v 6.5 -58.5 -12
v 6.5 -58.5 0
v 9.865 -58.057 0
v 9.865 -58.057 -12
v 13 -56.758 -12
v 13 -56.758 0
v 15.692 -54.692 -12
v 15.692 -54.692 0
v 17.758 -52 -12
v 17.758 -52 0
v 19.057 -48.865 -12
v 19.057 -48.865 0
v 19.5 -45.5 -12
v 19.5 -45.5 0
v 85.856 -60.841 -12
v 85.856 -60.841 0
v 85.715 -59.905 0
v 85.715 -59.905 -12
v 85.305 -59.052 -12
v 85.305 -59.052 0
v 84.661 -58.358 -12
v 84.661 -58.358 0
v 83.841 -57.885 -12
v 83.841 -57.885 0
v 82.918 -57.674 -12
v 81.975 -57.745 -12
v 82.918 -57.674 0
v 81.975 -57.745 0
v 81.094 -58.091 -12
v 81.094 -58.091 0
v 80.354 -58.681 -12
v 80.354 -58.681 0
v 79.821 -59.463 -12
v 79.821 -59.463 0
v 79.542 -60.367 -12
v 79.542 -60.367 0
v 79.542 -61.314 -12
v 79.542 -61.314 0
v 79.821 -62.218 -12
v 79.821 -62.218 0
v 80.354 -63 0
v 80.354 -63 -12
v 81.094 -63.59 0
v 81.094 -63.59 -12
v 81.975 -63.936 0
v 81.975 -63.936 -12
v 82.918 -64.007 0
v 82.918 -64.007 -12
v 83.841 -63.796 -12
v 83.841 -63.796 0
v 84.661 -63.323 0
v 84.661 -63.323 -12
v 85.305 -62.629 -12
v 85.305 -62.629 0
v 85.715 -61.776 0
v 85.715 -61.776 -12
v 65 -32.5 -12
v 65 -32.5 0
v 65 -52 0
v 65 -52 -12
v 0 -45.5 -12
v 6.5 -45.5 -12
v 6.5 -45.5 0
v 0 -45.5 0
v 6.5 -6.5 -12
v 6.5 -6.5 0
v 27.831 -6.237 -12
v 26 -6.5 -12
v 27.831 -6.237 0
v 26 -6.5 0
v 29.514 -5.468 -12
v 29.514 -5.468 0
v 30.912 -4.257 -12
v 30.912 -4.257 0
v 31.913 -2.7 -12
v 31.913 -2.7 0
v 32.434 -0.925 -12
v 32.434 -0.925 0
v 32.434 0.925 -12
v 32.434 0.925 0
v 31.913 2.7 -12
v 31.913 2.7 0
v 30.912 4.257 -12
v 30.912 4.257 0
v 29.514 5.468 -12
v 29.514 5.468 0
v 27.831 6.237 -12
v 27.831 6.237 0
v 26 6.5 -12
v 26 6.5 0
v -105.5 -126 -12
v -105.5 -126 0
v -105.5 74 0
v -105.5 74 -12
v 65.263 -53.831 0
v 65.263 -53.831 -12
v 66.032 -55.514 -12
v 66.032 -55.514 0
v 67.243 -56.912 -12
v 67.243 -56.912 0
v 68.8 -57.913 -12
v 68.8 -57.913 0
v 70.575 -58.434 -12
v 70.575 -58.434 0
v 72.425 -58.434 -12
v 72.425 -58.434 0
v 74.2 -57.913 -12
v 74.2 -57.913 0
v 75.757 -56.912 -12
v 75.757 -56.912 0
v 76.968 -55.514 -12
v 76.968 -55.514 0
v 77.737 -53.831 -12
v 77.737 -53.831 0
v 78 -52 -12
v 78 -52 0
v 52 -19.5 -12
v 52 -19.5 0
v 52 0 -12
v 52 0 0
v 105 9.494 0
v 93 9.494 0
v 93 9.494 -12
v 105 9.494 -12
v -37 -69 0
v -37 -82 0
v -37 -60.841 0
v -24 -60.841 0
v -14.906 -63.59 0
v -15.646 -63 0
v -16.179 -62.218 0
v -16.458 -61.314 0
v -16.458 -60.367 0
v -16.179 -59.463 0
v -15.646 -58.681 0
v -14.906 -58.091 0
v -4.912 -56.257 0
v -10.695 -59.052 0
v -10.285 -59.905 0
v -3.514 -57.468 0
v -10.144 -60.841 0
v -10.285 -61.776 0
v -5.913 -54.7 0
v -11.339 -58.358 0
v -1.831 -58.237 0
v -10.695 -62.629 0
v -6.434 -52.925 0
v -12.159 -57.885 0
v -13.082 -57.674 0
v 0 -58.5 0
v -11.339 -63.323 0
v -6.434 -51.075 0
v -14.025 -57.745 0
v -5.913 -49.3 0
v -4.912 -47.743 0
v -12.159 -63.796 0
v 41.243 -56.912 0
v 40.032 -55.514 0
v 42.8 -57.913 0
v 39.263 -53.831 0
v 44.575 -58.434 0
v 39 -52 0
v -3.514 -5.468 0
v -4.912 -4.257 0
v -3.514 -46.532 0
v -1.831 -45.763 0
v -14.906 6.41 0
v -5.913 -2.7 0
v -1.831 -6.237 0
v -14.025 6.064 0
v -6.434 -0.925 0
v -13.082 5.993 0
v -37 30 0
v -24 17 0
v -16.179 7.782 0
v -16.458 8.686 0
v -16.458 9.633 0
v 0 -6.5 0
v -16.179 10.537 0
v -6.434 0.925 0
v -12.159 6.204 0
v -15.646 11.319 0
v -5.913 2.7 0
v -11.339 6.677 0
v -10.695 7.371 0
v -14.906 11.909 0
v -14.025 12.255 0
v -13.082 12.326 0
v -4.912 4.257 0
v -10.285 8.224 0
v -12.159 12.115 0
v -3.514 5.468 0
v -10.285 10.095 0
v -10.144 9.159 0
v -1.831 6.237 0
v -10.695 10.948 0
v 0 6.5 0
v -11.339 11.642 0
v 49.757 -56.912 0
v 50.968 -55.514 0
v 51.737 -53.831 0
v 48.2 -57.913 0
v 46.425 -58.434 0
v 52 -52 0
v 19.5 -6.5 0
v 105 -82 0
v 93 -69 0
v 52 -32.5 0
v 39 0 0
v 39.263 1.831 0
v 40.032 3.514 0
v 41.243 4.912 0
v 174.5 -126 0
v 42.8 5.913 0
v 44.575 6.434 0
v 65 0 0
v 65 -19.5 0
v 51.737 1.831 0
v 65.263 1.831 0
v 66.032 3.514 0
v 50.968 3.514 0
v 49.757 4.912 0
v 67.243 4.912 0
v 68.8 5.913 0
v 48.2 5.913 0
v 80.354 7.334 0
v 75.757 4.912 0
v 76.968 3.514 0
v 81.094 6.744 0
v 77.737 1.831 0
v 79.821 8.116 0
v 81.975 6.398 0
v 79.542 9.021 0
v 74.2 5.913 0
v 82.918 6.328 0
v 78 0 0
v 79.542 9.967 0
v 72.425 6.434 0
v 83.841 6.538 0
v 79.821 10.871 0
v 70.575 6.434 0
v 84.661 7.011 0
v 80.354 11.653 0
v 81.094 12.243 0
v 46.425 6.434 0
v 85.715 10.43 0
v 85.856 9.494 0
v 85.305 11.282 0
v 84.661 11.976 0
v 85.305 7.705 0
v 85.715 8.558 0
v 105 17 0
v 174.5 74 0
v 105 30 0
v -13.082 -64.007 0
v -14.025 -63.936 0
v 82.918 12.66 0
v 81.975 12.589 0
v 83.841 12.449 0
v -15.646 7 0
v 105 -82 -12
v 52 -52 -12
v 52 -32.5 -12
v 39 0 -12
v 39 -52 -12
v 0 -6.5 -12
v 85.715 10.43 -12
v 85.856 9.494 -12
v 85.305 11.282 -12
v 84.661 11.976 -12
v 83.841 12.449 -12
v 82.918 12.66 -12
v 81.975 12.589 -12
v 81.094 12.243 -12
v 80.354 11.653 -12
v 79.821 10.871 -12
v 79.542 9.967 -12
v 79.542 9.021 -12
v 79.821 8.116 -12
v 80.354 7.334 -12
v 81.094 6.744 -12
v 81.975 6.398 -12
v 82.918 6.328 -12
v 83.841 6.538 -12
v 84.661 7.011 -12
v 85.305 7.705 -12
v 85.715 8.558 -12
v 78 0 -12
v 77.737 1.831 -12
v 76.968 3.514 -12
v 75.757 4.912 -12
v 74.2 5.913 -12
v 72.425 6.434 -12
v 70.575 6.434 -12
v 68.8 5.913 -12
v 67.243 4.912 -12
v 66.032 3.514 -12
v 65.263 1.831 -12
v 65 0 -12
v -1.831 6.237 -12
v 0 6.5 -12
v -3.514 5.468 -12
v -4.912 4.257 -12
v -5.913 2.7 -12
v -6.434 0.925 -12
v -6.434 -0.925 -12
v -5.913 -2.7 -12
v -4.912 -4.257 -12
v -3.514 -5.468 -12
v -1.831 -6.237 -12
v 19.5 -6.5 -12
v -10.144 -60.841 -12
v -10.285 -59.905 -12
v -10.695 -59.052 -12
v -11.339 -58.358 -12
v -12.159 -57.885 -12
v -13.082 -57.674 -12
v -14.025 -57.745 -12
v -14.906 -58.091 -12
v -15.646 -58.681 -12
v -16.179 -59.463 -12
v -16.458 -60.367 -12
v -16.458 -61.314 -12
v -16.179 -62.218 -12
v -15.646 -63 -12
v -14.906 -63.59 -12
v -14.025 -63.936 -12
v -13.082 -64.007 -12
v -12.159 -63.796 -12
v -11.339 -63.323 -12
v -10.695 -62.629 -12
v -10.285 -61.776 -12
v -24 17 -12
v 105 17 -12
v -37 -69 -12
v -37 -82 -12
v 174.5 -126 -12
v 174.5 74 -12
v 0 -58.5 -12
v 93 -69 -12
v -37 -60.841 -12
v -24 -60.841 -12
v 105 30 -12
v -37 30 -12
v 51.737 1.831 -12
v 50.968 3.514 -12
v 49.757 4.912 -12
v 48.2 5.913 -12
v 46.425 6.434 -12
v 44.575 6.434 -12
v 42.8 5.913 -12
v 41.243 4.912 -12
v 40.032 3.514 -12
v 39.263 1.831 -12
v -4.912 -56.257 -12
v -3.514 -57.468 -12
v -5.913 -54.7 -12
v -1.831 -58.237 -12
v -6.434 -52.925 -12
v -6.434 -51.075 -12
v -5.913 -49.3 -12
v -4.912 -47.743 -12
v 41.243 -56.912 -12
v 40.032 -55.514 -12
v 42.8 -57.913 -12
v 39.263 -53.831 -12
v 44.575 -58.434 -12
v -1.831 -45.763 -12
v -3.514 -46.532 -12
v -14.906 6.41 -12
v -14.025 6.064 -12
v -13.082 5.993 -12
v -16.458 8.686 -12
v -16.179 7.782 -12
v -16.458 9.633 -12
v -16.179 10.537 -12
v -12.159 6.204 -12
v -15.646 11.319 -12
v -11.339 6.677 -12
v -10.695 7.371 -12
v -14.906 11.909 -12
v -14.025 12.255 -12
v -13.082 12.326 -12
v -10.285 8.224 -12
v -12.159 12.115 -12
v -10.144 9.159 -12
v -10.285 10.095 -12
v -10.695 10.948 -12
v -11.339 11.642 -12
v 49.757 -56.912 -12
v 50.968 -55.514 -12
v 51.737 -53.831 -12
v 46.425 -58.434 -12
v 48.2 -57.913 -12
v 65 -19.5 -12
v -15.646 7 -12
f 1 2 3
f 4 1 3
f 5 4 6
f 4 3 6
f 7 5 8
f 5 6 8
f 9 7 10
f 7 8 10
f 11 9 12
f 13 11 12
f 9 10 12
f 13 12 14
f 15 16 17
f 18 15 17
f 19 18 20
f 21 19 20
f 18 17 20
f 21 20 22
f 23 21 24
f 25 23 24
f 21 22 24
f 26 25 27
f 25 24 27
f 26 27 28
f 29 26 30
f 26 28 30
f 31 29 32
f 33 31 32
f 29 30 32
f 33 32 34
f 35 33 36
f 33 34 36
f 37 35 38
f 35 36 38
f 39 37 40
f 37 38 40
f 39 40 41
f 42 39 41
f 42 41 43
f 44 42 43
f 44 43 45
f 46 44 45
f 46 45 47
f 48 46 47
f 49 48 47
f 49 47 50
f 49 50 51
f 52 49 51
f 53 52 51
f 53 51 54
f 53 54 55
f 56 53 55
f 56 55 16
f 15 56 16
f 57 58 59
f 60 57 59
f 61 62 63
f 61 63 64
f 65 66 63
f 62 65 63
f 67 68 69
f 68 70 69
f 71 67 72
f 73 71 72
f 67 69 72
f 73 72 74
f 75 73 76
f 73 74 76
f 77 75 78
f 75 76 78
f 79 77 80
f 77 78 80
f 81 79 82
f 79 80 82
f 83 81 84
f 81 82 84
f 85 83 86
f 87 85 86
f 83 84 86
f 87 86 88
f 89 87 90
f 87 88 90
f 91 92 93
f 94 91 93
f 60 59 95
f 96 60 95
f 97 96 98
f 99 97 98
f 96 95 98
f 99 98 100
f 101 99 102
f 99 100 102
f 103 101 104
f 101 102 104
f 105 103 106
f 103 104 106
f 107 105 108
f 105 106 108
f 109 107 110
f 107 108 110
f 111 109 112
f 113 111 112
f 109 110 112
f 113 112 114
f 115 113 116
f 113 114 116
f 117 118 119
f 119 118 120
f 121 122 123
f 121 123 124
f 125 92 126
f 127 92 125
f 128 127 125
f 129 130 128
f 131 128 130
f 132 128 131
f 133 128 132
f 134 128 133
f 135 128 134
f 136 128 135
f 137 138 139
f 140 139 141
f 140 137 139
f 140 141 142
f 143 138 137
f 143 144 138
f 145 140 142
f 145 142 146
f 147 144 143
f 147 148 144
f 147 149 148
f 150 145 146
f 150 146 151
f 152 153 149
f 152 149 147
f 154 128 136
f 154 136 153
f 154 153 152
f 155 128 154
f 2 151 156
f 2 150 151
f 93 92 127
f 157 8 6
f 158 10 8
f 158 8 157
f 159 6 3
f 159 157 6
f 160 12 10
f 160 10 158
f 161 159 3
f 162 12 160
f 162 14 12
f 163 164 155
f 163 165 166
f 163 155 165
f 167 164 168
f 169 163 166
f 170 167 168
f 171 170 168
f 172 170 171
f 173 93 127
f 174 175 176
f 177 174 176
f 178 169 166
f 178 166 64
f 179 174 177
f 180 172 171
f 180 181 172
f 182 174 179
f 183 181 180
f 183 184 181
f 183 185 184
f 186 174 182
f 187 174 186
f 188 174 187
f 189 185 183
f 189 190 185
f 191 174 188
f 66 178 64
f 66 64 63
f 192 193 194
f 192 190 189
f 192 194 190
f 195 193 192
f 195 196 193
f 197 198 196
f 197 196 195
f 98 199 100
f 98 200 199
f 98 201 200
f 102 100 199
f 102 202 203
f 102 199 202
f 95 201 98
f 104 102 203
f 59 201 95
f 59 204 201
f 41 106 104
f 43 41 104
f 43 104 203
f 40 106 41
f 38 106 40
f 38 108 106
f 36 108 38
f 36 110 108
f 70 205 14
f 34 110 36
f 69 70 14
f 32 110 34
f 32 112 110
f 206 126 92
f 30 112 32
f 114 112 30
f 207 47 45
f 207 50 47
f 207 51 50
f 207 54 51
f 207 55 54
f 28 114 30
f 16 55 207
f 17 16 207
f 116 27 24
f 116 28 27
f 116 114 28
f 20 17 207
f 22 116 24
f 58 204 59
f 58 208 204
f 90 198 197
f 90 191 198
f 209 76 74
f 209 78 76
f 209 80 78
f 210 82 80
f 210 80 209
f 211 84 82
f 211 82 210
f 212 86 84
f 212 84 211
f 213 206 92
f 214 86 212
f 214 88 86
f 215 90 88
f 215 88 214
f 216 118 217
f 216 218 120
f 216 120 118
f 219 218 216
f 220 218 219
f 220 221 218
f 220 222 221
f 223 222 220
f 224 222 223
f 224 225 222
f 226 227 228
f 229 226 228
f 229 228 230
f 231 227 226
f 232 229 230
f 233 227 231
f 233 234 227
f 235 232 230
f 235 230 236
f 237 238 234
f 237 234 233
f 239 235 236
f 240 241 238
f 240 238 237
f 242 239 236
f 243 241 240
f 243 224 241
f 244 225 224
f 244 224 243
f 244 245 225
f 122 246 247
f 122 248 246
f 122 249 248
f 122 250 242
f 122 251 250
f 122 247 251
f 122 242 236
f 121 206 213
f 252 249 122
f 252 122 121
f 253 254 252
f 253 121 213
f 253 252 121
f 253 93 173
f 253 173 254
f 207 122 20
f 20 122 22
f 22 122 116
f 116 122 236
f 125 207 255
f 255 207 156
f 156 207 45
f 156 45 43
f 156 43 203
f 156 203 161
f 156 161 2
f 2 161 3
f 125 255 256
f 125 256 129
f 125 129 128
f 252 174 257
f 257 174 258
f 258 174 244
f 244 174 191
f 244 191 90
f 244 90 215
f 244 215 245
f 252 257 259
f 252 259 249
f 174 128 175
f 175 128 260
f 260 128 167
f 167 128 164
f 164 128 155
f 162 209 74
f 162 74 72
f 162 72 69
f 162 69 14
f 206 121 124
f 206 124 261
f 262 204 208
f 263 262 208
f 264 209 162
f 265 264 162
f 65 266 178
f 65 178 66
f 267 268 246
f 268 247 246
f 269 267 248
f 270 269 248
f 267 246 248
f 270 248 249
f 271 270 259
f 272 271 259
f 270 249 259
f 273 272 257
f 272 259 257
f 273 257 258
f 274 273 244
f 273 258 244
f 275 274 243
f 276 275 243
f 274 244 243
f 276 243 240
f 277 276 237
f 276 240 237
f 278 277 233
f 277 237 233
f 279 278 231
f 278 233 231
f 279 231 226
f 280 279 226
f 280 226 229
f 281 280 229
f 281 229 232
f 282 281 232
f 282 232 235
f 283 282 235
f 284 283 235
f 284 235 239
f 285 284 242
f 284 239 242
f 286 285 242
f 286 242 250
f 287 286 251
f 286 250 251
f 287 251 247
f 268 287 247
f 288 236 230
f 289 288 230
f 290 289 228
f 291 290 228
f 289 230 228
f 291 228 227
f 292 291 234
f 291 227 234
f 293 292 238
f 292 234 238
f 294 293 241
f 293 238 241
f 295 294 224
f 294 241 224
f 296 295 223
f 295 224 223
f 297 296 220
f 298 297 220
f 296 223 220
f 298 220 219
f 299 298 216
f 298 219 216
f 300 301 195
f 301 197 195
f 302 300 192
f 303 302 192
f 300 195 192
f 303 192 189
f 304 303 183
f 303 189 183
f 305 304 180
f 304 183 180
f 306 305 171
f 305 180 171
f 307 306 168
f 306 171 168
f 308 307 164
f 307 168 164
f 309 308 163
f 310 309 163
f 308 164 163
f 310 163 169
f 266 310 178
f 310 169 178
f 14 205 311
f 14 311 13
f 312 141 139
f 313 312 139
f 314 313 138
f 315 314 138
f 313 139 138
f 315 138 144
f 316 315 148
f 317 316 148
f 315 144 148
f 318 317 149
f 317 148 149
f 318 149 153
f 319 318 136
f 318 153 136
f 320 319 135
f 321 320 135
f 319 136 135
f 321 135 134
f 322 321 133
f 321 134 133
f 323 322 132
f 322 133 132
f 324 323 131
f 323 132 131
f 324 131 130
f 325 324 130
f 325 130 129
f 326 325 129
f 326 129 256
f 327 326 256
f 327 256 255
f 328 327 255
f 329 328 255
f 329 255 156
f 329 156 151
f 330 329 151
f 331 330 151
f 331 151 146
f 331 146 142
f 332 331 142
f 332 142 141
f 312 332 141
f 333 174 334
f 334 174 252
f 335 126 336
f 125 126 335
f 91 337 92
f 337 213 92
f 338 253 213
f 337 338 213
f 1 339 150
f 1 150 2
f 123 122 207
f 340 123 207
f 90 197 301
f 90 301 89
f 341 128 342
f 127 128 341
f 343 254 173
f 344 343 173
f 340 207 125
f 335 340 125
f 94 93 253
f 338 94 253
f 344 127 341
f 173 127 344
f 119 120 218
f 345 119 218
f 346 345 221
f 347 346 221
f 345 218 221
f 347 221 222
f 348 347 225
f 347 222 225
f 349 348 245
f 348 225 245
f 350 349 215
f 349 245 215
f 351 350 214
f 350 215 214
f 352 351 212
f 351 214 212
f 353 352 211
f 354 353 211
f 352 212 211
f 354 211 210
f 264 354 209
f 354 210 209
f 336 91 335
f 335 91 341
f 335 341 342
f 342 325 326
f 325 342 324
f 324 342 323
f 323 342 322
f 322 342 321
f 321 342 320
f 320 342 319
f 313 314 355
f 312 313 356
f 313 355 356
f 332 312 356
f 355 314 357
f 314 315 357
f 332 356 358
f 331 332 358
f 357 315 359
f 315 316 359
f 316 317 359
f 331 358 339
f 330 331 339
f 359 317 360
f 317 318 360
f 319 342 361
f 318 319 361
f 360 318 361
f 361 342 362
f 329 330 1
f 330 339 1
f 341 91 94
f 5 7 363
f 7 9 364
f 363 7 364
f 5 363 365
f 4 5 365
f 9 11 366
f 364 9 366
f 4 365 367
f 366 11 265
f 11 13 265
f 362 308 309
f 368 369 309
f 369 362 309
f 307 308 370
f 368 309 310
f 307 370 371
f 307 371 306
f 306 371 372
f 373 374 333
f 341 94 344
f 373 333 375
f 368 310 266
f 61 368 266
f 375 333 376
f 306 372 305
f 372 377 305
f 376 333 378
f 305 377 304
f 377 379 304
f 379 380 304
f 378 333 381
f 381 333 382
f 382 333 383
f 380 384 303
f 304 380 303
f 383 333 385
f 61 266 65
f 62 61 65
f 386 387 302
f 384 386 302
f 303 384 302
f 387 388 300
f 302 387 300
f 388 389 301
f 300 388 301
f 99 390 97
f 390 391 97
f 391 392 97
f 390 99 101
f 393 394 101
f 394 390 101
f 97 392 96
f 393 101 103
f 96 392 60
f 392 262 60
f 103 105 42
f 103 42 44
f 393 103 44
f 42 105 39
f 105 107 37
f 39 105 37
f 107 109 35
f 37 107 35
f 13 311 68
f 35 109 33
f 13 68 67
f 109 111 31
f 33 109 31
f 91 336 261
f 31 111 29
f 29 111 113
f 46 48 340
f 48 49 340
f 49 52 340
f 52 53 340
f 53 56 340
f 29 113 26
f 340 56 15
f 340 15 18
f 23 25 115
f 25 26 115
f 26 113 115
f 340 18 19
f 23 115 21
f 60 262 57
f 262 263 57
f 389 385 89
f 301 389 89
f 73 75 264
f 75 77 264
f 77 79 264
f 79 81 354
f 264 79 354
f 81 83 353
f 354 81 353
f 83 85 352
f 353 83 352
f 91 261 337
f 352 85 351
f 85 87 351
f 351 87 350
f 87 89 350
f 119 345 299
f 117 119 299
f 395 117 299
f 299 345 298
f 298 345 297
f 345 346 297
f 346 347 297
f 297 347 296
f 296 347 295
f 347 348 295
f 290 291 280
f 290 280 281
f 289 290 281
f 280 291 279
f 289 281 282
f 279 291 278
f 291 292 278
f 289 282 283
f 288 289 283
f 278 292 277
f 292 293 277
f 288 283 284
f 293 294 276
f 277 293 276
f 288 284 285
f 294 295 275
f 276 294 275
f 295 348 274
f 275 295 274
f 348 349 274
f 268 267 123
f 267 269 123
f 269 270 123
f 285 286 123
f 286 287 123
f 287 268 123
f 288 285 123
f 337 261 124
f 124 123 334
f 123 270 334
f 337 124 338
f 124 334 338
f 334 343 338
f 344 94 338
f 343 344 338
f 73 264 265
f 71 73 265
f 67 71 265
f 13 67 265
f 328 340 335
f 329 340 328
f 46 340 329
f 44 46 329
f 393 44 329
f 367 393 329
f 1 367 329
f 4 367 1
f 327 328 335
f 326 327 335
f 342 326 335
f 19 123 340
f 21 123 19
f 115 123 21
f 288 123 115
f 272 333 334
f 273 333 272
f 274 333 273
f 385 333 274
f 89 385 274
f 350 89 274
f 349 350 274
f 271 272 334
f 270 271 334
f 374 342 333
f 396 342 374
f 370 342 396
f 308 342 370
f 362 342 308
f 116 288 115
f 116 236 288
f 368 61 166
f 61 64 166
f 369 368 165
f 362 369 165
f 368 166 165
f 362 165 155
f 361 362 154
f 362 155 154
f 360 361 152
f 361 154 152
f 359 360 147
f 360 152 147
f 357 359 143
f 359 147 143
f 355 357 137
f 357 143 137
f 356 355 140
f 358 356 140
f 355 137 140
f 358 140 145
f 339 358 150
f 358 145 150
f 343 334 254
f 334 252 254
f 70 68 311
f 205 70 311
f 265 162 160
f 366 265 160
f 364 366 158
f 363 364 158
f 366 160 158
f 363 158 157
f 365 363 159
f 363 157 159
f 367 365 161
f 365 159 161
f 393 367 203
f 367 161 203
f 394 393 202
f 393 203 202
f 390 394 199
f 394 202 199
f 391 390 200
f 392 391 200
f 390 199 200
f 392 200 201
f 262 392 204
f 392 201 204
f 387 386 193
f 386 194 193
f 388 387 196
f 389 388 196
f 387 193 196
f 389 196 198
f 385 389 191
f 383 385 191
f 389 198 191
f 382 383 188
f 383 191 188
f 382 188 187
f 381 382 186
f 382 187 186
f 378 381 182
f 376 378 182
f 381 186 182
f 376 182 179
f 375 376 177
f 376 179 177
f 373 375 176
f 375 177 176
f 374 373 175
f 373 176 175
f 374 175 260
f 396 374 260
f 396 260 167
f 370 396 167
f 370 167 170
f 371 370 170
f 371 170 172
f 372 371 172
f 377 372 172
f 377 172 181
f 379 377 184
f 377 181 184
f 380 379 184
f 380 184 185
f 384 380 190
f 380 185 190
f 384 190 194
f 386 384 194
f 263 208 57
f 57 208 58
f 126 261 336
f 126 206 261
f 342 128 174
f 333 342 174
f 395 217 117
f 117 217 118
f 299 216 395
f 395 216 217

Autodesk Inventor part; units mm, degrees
ref_plane "YZ Plane" through (0, 0, 0) normal (1, 0, 0) x (0, 1, 0)
ref_plane "XZ Plane" through (0, 0, 0) normal (0, 1, 0) x (-1, 0, 0)
ref_plane "XY Plane" through (0, 0, 0) normal (0, 0, 1) x (1, 0, 0)
sketch "Sketch1" plane through (0, 0, 0) normal (0, 0, 1) x (1, 0, 0)
  arc A0 (0, 6.5) -> (0, -6.5) centre (0, 0) ccw
  line L0 (0, 6.5) -> (26, 6.5)
  line L1 (0, -6.5) -> (6.5, -6.5)
  arc A1 (26, -6.5) -> (26, 6.5) centre (26, 0) ccw
  line L2 (26, -6.5) -> (19.5, -6.5)
  line L3 (6.5, -6.5) -> (6.5, -45.5)
  line L4 (19.5, -6.5) -> (19.5, -45.5)
  line L5 (6.5, -45.5) -> (0, -45.5)
  arc A2 (0, -45.5) -> (0, -58.5) centre (0, -52) ccw
  line L6 (0, -58.5) -> (6.5, -58.5)
  arc A3 (6.5, -58.5) -> (19.5, -45.5) centre (6.5, -45.5) ccw
  line L7 (39, 0) -> (39, -52)
  arc A4 (39, -52) -> (52, -52) centre (45.5, -52) ccw
  line L8 (52, -52) -> (52, -32.5)
  line L9 (52, -32.5) -> (65, -32.5)
  line L10 (65, 0) -> (65, -19.5)
  line L11 (65, -19.5) -> (52, -19.5)
  line L12 (52, -19.5) -> (52, 0)
  line L13 (78, 0) -> (78, -52)
  line L14 (65, -32.5) -> (65, -52)
  arc A5 (65, -52) -> (78, -52) centre (71.5, -52) ccw
  arc A6 (52, 0) -> (39, 0) centre (45.5, 0) ccw
  arc A7 (78, 0) -> (65, 0) centre (71.5, 0) ccw
  point P0 (0, 0)
  point P1 (0, 0)
  dimension "d0" = 26
  dimension "d1" = 6.5
  dimension "d2" = 13
  dimension "d3" = 13
  dimension "d4" = 6.5
  dimension "d5" = 13
  dimension "d6" = 39
  dimension "d7" = 39
  dimension "d8" = 6.5
  dimension "d9" = 52
  dimension "d10" = 6.5
  dimension "d11" = 13
  dimension "d12" = 19.5
  dimension "d13" = 13
  dimension "d14" = 13
  dimension "d15" = 13
  dimension "d16" = 19.5
  dimension "d17" = 13
  dimension "d19" = 52
  dimension "d20" = 13
  dimension "d22" = 6.5
  dimension "d23" = 19.5
  dimension "d24" = 6.5
  dimension "d53" = 19.5
sketch "Sketch2" plane through (0, 0, 0) normal (0, 0, 1) x (1, 0, 0)
  circle A0 centre (-13.3188, 9.1594) radius 3.175
  circle A1 centre (-13.3188, -60.8406) radius 3.175
  circle A2 centre (82.6812, -60.8406) radius 3.175
  circle A3 centre (82.6812, 9.4938) radius 3.175
  line L0 (-24, 17) -> (93, 17)
  line L1 (93, 17) -> (93, -69)
  line L2 (93, -69) -> (-24, -69)
  line L3 (-24, -69) -> (-24, 17)
  line L4 (-105.5, 74) -> (174.5, 74)
  line L5 (174.5, 74) -> (174.5, -126)
  line L6 (174.5, -126) -> (-105.5, -126)
  line L7 (-105.5, -126) -> (-105.5, 74)
  line L8 (93, 9.4938) -> (105, 9.4938)
  line L9 (105, 9.4938) -> (105, -69)
  line L10 (105, -69) -> (93, -69)
  line L11 (93, -69) -> (93, 9.4938)
  line L12 (-24, -69) -> (105, -69)
  line L13 (-24, 17) -> (-24, -60.8406)
  line L14 (105, -82) -> (-37, -82)
  line L15 (-37, -82) -> (-37, -69)
  line L16 (-37, -69) -> (105, -69)
  line L17 (105, -69) -> (105, -82)
  line L18 (-24, -60.8406) -> (-37, -60.8406)
  line L19 (-37, -60.8406) -> (-37, 30)
  line L20 (-37, 30) -> (-24, 30)
  line L21 (-24, 30) -> (-24, -60.8406)
  line L22 (-24, 17) -> (105, 17)
  line L23 (105, 17) -> (105, 30)
  line L24 (105, 30) -> (-24, 30)
  line L25 (-24, 30) -> (-24, 17)
  point P0 (0, 0)
  point P1 (82.6812, 17)
  dimension "d54" = 6.35
  dimension "d55" = 6.35
  dimension "d56" = 6.35
  dimension "d57" = 6.35
  dimension "d62" = 117
  dimension "d63" = 86
  dimension "d64" = 280
  dimension "d65" = 200
  dimension "d66" = 57
  dimension "d68" = 17
  dimension "d69" = 24
  dimension "d70" = 81.5
extrude "Extrusion6" add sketch "Sketch2" against normal blind 12 contours L0 L1 L2 L3 | L4 L5 L6 L7
extrude "Extrusion7" cut sketch "Sketch1" against normal blind 12
properties part number "JH" material "Polyethylene, High Density"
